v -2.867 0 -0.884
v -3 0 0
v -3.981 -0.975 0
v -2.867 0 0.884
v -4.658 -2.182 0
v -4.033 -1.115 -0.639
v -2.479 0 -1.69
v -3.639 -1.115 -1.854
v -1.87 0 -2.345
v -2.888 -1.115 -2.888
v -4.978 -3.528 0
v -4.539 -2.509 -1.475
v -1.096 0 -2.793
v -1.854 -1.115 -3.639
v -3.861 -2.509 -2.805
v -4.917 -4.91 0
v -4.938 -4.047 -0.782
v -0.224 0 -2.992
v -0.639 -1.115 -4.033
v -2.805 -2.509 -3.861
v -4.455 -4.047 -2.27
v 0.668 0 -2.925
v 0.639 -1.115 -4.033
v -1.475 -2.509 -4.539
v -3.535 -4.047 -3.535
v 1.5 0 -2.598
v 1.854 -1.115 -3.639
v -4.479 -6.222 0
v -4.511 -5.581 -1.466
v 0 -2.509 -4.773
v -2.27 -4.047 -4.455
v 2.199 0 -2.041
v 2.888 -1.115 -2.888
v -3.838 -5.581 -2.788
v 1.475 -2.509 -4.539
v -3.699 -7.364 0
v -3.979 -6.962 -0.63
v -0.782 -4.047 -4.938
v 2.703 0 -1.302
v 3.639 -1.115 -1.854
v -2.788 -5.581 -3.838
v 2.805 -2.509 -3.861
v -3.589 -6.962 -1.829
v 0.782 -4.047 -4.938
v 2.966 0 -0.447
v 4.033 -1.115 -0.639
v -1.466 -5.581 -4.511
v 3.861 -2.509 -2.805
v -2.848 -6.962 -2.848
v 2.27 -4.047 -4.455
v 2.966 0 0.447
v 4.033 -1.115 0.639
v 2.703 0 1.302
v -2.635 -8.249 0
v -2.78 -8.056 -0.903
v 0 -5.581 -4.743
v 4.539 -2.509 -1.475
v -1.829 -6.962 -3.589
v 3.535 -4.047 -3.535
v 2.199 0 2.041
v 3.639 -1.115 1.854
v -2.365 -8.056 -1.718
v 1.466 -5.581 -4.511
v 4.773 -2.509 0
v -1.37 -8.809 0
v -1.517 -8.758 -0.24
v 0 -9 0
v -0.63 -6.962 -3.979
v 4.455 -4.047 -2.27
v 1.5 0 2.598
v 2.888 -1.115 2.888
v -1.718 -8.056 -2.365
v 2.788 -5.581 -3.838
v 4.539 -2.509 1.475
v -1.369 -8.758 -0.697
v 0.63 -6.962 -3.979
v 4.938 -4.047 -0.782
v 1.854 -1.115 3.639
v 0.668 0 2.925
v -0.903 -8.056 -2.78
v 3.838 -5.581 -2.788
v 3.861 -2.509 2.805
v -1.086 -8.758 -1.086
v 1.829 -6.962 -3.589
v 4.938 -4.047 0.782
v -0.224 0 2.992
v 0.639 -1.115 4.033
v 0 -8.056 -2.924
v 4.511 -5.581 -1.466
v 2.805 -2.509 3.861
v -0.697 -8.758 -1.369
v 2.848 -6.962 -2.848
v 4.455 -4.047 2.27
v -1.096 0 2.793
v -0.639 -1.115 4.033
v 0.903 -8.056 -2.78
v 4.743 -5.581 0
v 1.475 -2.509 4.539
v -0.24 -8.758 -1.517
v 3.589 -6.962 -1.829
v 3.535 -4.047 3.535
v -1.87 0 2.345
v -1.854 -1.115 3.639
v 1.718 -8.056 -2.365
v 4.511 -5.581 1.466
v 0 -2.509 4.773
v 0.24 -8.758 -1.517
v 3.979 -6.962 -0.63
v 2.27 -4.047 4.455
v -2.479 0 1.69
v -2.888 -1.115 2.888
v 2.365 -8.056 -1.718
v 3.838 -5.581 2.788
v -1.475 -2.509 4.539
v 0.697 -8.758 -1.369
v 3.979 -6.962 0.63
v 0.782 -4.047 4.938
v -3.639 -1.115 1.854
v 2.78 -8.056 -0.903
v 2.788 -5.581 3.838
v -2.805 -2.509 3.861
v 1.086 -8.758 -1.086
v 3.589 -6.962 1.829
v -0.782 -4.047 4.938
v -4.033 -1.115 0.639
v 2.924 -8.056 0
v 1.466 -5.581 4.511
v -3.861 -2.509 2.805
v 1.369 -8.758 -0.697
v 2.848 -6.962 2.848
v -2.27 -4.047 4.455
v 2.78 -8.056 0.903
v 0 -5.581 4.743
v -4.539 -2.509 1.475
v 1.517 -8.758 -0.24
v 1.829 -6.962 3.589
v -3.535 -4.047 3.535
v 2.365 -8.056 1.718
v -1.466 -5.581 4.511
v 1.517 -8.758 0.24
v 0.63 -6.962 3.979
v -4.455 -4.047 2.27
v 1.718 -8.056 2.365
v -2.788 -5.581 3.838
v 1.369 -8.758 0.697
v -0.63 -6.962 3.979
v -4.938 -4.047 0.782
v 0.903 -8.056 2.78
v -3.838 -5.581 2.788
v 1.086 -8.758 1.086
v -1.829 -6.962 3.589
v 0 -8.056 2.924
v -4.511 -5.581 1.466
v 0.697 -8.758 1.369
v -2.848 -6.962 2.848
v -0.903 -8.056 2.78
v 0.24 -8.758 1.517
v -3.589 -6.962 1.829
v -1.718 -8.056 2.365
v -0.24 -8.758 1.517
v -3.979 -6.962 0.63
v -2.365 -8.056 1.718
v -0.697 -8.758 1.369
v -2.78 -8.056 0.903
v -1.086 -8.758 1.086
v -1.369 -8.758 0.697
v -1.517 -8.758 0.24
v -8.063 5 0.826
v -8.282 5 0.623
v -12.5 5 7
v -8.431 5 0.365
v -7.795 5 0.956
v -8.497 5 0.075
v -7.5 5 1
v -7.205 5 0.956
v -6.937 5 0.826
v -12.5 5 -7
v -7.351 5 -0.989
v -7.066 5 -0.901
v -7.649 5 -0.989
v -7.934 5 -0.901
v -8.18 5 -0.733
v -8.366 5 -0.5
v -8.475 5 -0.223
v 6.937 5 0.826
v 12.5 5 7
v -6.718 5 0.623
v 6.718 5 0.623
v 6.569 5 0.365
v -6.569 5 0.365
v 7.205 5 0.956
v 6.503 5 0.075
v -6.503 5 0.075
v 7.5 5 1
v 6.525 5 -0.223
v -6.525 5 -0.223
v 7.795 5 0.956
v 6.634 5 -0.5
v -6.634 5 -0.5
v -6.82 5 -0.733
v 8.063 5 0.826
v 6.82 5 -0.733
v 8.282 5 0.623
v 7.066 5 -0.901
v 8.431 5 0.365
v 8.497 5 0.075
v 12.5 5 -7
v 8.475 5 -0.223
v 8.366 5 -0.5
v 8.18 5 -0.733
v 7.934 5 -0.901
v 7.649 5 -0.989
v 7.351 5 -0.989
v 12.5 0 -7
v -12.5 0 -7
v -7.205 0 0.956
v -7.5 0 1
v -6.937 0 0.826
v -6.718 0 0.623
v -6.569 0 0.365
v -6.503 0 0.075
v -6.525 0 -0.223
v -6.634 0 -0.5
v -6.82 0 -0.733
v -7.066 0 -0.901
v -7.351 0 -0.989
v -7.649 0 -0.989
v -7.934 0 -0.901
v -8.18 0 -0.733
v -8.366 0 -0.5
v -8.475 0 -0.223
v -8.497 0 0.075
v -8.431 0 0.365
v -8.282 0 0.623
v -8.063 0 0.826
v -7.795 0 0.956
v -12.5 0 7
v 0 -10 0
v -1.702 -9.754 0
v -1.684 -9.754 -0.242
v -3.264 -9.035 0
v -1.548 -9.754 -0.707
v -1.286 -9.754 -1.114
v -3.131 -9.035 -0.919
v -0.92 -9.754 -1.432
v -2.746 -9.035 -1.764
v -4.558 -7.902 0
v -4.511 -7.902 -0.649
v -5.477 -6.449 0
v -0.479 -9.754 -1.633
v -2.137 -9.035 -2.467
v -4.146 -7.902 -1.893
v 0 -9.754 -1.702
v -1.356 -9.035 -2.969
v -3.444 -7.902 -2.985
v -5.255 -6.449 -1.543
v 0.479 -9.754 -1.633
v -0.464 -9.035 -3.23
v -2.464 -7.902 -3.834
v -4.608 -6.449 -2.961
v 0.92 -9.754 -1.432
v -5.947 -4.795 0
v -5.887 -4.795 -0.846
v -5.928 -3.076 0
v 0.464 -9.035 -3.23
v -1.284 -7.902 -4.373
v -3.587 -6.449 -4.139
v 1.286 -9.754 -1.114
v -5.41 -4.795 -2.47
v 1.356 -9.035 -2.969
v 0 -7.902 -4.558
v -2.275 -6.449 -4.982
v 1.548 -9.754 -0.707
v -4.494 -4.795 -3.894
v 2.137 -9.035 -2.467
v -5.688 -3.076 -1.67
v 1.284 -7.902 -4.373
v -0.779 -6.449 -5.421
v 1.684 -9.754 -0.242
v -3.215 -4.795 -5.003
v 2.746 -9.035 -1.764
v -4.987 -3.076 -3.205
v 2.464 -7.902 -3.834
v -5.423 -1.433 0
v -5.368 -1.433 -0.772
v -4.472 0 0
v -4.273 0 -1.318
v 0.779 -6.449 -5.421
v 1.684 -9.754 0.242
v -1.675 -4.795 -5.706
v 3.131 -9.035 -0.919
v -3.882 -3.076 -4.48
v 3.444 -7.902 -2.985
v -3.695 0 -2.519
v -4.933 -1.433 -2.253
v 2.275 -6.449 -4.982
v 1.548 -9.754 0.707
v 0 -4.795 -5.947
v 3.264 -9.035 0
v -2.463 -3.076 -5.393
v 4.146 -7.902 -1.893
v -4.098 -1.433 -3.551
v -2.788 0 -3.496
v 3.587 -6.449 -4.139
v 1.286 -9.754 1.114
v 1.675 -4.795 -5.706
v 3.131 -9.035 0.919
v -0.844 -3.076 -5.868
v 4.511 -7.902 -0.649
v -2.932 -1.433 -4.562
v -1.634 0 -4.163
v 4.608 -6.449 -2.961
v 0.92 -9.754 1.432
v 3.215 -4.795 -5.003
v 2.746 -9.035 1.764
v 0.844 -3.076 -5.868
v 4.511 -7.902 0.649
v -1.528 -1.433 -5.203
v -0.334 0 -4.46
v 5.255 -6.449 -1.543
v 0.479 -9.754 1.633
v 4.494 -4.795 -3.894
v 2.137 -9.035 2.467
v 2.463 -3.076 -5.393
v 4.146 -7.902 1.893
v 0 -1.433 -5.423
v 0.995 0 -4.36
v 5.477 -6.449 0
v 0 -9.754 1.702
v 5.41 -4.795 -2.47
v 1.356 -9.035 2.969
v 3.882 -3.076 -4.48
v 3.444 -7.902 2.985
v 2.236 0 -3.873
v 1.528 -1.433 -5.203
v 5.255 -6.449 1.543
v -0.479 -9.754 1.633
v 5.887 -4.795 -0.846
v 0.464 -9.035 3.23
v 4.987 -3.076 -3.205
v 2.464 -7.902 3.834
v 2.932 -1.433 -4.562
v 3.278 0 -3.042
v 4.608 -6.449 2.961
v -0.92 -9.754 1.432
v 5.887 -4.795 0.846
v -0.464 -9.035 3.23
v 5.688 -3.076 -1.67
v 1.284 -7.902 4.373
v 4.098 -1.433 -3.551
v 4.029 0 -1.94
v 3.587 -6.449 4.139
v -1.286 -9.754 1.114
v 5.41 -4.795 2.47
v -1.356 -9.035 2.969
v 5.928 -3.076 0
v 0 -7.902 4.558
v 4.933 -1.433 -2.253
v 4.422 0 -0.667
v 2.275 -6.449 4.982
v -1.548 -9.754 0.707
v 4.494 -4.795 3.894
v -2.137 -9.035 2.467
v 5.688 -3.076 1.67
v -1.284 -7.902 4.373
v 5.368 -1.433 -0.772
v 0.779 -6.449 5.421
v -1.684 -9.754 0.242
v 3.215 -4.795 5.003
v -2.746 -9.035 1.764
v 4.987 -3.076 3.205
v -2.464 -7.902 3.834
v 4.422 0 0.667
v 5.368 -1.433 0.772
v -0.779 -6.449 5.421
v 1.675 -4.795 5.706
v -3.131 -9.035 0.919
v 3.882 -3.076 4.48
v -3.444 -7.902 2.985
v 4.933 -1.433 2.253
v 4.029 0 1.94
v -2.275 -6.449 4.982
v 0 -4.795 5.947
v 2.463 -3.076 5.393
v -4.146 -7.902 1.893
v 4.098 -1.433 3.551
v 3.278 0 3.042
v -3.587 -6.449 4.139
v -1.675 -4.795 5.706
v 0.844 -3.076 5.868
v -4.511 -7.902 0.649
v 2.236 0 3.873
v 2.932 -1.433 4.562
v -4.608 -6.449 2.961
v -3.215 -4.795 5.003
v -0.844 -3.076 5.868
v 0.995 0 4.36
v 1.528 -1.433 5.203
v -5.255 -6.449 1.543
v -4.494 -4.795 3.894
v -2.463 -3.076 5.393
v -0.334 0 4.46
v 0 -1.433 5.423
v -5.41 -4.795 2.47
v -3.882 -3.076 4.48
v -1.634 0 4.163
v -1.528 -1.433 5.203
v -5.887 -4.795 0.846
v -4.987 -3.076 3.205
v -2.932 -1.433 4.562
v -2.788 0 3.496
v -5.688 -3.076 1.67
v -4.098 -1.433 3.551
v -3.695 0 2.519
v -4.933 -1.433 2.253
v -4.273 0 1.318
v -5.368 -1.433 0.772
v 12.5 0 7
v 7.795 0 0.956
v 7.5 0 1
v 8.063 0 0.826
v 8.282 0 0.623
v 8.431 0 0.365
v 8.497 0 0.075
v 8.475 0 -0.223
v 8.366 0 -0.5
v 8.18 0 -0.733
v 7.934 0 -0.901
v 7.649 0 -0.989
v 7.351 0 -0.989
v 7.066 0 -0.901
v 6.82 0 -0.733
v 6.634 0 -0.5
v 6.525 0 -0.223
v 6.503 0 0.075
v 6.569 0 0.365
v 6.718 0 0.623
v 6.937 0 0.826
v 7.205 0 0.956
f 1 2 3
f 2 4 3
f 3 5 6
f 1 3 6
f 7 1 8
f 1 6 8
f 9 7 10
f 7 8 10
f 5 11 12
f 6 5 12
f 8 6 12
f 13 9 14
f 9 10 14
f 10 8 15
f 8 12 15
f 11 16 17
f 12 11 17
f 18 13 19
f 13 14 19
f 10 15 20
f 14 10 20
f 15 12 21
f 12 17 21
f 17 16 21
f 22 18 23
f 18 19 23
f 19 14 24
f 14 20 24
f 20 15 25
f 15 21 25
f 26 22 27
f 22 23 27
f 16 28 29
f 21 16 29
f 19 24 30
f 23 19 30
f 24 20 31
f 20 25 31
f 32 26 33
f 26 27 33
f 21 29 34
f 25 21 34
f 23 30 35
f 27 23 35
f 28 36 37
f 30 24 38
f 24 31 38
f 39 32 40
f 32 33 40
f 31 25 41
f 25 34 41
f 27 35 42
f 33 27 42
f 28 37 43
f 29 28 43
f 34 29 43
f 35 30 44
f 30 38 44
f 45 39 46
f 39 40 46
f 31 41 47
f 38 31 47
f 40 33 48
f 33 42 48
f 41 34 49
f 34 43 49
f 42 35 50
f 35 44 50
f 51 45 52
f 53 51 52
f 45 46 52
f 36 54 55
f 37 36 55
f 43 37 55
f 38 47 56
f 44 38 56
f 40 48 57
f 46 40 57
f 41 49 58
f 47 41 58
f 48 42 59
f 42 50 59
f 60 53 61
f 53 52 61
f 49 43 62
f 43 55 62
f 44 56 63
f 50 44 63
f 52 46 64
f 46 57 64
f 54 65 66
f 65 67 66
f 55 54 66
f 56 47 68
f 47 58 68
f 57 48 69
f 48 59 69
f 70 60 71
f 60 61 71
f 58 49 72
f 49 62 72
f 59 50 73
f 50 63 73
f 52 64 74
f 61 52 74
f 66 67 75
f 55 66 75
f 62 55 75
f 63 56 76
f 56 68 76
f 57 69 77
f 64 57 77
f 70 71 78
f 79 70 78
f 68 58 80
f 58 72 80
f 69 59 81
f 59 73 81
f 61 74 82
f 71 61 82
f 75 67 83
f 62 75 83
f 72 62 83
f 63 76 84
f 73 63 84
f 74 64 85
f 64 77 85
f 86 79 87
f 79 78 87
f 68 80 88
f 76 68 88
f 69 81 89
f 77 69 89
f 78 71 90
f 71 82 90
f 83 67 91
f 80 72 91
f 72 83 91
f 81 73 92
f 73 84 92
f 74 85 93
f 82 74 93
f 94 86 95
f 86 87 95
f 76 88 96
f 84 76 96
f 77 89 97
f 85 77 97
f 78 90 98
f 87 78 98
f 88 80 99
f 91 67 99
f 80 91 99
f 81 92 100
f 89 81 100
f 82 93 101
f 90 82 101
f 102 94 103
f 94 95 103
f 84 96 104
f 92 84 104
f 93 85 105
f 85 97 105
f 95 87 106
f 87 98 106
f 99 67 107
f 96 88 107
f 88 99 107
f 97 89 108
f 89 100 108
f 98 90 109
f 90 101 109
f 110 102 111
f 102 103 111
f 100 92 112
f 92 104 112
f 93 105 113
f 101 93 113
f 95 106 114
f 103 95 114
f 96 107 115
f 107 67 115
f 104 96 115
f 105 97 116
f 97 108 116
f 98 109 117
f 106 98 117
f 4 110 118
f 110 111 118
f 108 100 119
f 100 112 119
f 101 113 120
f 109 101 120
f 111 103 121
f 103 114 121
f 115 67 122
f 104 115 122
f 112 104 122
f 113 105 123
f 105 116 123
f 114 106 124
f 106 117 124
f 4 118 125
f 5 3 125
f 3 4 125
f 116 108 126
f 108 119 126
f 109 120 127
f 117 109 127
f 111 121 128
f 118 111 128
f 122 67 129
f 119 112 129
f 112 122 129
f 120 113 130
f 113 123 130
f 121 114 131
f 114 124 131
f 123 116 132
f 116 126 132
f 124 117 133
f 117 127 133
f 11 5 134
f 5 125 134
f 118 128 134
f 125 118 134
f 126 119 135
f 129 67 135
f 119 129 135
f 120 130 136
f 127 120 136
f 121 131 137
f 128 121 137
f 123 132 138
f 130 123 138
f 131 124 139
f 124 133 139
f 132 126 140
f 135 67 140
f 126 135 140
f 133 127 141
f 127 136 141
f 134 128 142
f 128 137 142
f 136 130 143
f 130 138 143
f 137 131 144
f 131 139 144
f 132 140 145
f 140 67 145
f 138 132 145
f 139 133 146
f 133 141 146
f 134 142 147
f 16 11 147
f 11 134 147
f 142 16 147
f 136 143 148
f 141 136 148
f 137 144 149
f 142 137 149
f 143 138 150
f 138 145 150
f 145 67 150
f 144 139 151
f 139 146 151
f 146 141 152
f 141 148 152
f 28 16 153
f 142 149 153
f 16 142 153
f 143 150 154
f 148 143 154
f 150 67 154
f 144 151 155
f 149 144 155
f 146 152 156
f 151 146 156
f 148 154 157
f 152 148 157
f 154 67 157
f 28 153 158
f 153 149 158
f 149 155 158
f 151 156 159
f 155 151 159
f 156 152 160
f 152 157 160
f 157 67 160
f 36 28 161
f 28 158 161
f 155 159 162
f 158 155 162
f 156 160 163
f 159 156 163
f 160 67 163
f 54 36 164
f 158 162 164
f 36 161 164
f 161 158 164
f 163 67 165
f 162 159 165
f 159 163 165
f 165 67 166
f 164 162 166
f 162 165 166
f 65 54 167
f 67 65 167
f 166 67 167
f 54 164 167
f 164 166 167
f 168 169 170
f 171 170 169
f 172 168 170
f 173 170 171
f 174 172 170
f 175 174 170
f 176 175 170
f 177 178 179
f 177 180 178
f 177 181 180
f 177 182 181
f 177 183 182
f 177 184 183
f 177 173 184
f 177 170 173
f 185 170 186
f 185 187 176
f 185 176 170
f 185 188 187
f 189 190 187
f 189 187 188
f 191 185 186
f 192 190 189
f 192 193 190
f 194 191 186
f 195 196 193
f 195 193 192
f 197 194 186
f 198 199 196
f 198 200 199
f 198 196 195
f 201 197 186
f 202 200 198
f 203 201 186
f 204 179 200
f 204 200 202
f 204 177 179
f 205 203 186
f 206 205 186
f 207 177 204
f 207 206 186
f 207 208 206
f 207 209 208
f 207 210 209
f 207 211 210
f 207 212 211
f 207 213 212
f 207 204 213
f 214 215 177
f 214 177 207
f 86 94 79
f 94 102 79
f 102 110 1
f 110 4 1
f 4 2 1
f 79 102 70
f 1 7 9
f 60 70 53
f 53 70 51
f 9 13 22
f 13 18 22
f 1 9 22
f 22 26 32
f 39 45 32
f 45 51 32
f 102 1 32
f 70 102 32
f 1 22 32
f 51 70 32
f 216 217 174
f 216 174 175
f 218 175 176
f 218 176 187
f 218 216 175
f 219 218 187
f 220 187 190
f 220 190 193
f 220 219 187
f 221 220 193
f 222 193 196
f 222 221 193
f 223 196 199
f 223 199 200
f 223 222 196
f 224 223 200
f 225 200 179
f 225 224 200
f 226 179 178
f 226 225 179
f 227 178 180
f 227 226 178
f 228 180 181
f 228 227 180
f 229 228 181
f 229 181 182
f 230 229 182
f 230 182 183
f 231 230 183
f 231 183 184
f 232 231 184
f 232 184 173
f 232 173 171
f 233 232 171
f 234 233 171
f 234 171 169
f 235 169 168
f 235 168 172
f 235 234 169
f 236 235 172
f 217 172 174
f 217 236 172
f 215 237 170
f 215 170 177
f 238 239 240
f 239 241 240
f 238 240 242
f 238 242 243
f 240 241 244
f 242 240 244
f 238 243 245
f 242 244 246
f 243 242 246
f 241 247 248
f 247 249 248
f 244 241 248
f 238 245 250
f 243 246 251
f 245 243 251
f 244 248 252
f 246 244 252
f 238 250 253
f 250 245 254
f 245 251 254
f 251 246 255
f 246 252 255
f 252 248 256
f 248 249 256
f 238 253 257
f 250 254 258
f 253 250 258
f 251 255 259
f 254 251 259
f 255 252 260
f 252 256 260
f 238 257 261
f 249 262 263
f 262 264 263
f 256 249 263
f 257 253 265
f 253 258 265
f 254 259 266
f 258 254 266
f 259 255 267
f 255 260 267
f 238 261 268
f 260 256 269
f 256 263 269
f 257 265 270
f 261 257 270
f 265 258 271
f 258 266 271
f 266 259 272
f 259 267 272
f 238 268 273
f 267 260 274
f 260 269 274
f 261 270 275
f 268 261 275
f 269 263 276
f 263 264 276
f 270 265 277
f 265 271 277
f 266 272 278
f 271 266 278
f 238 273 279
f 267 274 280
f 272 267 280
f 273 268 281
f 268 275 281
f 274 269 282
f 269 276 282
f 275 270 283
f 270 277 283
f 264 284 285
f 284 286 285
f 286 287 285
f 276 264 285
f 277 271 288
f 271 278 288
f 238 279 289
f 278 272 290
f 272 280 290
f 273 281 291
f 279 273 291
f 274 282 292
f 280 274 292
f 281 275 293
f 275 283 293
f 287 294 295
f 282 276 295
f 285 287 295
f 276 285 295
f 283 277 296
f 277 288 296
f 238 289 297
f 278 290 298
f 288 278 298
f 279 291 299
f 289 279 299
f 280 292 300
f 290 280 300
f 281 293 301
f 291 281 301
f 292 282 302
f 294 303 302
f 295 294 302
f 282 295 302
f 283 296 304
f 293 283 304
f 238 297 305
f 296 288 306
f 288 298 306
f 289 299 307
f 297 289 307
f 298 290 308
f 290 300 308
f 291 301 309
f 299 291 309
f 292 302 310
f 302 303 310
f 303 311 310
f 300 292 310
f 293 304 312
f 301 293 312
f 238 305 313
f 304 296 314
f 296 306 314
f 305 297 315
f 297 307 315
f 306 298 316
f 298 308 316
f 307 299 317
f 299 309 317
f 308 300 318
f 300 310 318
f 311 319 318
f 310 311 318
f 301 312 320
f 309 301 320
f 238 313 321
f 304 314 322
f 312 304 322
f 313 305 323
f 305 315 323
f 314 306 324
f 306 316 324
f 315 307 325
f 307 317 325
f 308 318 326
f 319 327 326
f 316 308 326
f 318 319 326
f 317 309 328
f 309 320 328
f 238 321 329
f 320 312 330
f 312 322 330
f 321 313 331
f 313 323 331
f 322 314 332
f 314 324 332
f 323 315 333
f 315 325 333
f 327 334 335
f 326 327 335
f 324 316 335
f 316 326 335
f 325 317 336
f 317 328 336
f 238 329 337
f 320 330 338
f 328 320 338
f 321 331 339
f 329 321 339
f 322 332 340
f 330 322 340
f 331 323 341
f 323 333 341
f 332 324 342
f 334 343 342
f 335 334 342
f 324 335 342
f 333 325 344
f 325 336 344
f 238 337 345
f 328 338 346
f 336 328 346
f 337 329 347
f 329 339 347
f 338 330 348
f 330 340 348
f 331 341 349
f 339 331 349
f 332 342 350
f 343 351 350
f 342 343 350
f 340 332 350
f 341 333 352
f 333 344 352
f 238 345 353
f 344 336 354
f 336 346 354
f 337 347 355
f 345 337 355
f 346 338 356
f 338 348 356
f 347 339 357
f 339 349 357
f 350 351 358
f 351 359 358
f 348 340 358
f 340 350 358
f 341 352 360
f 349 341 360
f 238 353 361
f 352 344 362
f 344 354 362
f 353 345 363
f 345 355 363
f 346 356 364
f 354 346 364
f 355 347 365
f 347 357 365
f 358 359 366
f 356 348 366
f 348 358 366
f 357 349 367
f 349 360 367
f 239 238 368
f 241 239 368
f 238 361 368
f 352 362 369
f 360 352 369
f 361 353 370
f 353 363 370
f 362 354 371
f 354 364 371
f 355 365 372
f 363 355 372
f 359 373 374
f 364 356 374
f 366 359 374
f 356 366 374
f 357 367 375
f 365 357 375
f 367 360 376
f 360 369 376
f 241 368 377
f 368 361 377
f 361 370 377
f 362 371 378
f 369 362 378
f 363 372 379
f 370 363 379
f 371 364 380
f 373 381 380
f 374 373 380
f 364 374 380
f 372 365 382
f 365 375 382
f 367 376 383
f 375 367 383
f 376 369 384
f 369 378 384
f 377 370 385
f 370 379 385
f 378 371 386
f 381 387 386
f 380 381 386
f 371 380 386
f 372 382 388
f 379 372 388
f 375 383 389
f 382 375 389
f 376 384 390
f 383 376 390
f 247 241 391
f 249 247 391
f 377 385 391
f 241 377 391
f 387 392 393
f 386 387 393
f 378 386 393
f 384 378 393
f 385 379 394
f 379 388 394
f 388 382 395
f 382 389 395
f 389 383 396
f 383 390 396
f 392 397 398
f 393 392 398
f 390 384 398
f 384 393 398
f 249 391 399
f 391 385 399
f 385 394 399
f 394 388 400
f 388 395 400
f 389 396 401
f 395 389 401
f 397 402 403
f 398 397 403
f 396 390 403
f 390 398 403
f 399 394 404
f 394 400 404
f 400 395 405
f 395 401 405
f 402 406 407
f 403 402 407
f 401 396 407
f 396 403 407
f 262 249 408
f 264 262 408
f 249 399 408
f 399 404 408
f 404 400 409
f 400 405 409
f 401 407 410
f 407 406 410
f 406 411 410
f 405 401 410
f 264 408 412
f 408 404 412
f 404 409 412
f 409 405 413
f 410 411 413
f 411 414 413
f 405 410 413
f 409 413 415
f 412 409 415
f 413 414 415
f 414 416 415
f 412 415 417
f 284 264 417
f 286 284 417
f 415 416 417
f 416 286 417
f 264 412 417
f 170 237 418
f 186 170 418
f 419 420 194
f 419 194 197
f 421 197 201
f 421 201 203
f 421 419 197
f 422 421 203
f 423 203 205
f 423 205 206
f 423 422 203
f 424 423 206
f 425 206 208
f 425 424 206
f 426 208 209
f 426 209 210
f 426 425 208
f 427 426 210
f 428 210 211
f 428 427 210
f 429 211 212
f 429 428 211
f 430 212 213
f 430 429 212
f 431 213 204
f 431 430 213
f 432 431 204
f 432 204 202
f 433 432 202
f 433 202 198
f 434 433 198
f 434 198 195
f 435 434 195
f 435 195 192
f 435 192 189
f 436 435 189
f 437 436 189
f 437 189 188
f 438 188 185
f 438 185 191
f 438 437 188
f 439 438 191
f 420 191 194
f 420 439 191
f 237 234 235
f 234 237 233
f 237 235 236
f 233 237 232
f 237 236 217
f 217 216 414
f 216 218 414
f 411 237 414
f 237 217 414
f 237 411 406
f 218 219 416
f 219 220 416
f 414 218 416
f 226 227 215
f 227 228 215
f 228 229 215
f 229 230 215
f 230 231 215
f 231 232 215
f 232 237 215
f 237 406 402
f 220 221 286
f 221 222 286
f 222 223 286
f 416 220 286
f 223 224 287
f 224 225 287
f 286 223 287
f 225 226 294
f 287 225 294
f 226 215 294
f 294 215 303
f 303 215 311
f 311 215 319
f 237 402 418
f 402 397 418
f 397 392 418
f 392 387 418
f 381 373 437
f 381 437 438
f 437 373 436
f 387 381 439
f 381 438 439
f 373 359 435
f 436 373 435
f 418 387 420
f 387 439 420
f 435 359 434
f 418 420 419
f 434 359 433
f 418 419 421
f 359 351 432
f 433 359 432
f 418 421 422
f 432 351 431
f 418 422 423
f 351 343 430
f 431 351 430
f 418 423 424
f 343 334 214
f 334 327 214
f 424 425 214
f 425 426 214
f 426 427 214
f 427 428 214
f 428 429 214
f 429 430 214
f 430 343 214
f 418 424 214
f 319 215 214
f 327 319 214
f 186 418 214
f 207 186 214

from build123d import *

# Parameters (mm, degrees)
SKETCH1_W           = 25
SKETCH1_H           = 14
SKETCH1_R           = 1
BOSS_EXTRUDE1_DEPTH = 5


with BuildPart() as part:
    # Sketch1 → Boss-Extrude1 (new body)
    with BuildSketch(Plane(origin=(0, 0, 0), x_dir=(1, 0, 0), z_dir=(0, 1, 0))):
        Rectangle(SKETCH1_W, SKETCH1_H)
        with Locations(Location((7.5, 0, 0), (0, 0, 270))):
            Circle(SKETCH1_R, mode=Mode.SUBTRACT)
        with Locations(Location((-7.5, 0, 0), (0, 0, 270))):
            Circle(SKETCH1_R, mode=Mode.SUBTRACT)
    extrude(amount=BOSS_EXTRUDE1_DEPTH)

    # Sketch2 → Revolve-Thin1 (revolve)
    with BuildSketch(Plane.XY):
        with BuildLine():
            ThreePointArc((0, -10), (-6, -4), (0, 2))
            Line((0, 2), (0, 1))
            ThreePointArc((0, 1), (-5, -4), (0, -9))
            Line((0, -9), (0, -10))
        make_face()
    revolve(axis=Axis((0, 2, 0), (0, -1, 0)))


solid = part.part
